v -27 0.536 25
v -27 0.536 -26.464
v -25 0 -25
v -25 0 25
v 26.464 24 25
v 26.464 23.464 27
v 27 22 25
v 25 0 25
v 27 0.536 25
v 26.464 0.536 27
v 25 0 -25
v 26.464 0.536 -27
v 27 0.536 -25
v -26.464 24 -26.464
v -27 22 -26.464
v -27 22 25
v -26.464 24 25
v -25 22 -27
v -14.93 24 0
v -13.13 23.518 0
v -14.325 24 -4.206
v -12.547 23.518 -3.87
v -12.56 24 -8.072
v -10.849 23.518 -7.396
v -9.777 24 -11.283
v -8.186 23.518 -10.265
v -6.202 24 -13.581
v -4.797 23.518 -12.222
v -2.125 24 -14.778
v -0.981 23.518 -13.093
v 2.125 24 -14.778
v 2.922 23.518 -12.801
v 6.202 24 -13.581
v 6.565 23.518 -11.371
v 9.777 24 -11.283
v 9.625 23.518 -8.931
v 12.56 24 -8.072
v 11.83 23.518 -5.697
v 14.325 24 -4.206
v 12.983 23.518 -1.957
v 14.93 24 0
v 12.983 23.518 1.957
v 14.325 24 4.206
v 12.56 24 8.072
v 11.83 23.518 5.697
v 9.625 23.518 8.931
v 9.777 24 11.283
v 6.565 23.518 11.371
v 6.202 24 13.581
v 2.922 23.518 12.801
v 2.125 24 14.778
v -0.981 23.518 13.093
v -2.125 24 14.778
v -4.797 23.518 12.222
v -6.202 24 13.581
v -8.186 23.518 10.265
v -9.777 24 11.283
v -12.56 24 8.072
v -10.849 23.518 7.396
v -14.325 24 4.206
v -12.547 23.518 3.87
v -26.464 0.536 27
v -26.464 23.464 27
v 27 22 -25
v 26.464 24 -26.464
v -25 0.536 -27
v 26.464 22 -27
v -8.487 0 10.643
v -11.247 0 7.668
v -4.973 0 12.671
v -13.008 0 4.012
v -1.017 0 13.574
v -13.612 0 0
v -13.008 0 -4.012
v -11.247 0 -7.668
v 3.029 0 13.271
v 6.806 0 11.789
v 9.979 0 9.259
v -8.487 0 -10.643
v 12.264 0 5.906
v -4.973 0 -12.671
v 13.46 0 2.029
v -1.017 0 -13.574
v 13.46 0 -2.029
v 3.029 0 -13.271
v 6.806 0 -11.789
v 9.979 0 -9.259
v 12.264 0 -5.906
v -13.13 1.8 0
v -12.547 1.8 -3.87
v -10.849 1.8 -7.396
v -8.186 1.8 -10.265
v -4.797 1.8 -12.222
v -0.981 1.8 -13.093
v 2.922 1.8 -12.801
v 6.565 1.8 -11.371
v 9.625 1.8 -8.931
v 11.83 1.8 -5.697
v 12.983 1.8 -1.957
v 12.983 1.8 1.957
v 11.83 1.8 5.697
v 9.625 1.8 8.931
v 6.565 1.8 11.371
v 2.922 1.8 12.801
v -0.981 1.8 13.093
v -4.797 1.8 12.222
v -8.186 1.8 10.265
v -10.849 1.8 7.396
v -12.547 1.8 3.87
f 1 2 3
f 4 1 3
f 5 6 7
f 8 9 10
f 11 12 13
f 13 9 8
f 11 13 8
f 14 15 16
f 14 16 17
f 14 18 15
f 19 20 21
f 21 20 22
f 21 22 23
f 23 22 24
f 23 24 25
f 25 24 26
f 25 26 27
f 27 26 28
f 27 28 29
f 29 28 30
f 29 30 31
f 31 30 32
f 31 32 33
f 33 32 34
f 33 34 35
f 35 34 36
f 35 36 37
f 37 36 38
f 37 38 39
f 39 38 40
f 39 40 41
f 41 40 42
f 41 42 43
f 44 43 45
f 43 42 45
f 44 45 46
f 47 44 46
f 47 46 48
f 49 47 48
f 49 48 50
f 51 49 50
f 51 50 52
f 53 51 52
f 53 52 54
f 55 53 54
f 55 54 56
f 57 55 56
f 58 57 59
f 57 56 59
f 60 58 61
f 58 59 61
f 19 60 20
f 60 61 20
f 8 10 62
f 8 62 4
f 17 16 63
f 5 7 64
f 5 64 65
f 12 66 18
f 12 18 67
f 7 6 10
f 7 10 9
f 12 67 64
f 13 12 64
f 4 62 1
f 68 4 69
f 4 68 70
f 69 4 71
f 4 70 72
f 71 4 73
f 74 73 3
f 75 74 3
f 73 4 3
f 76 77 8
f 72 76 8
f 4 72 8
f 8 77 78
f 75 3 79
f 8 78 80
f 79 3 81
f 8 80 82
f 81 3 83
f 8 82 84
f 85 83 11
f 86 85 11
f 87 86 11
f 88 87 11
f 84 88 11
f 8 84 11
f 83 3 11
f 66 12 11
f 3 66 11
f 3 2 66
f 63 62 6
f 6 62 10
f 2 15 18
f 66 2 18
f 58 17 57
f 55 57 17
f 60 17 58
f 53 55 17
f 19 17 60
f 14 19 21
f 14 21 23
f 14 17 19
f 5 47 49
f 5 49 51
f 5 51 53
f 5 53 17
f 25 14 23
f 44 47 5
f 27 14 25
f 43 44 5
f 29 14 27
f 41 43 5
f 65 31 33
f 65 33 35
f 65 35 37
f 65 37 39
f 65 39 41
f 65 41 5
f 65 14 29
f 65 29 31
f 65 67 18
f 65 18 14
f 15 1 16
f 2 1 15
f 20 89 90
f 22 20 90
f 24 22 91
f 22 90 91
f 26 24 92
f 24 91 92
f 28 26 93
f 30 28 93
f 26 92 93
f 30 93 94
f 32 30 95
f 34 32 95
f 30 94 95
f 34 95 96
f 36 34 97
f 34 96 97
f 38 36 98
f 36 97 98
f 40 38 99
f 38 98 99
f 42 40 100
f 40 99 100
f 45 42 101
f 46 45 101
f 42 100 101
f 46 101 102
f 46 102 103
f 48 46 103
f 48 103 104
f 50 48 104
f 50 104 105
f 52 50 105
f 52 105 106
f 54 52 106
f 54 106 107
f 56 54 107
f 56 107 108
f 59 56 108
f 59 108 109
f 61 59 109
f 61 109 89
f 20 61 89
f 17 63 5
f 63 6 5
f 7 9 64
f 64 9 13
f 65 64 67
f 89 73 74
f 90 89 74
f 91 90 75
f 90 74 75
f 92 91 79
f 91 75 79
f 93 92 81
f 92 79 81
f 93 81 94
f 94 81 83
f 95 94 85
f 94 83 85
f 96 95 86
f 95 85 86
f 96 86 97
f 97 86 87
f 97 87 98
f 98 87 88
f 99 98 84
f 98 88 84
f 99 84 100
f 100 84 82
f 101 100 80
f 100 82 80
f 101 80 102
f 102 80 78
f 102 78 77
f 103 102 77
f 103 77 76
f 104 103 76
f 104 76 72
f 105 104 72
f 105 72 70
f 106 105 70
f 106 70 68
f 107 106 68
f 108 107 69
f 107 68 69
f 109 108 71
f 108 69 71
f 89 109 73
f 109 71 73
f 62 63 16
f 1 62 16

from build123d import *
from OCP.BRepFilletAPI import BRepFilletAPI_MakeChamfer

# Parameters (mm, degrees)
SKETCH1_W             = 54
SKETCH1_H             = 54
BOSS_EXTRUDE1_DEPTH   = 24
M24_CLEARANCE_HOLE1_D = 26.26
CHAMFER2_SIZE         = 1.8
CHAMFER2_SIZE2        = 0.482308546


with BuildPart() as part:
    # Sketch1 → Boss-Extrude1 (new body)
    with BuildSketch(Plane(origin=(0, 0, 0), x_dir=(1, 0, 0), z_dir=(0, 1, 0))):
        Rectangle(SKETCH1_W, SKETCH1_H)
    extrude(amount=BOSS_EXTRUDE1_DEPTH)

    # Chamfer1
    # the kernel refuses this chamfer: 2, 0.535898385 mm, written as the material it takes off along each edge
    with BuildSketch(Plane(origin=(26.64273441, 22.666666667, -26.154700538), x_dir=(0.25881904510252285, 0, 0.9659258262890678), z_dir=(0.9636113749942796, 0.0691841839943633, -0.2581988897471632)), Plane(origin=(-26.154700538, 22.666666667, -26.64273441), x_dir=(0.9659258262890678, 0, -0.25881904510252285), z_dir=(-0.2581988897471632, 0.0691841839943633, -0.9636113749942796))) as chamfer1_piece_1:
        Polygon((-0.86273015, 0.668267901), (1.20782221, 0.668267901), (-0.34509206, -1.336535802), align=None)
    extrude(amount=0.720242762, mode=Mode.SUBTRACT)
    with BuildSketch(Plane(origin=(26.64273441, 23.154700538, 25.666666667), x_dir=(0.21132486540518758, -0.5773502691896254, -0.788675134594813), z_dir=(0.9636113749942801, 0.2581988897471616, 0.06918418399436459))) as chamfer1_piece_2:
        Polygon((-1.267949192, -0.545638456), (1.267949192, -0.545638456), (0, 1.091276912), align=None)
    extrude(amount=0.720242762, mode=Mode.SUBTRACT)
    with BuildSketch(Plane(origin=(26.154700538, 0.35726559, -25.666666667), x_dir=(0.25881904510252285, 0, 0.9659258262890678), z_dir=(0.2581988897471617, -0.9636113749942801, -0.06918418399436507)), Plane(origin=(-25.666666667, 0.35726559, -26.154700538), x_dir=(0.9659258262890678, 0, -0.25881904510252285), z_dir=(-0.06918418399436507, -0.9636113749942801, -0.2581988897471617)), Plane(origin=(-26.154700538, 0.35726559, 25.666666667), x_dir=(-0.25881904510252124, 0, -0.9659258262890682), z_dir=(-0.2581988897471617, -0.9636113749942801, 0.0691841839943646))) as chamfer1_piece_3:
        Polygon((-1.20782221, -0.668267901), (0.86273015, -0.668267901), (0.34509206, 1.336535802), align=None)
    extrude(amount=0.720242762, mode=Mode.SUBTRACT)
    with BuildSketch(Plane(origin=(26.154700538, 0.35726559, 25.666666667), x_dir=(0.25881904510252124, 0, -0.9659258262890682), z_dir=(0.2581988897471617, -0.9636113749942801, 0.0691841839943646))) as chamfer1_piece_4:
        Polygon((-1.20782221, 0.668267901), (0.86273015, 0.668267901), (0.34509206, -1.336535802), align=None)
    extrude(amount=0.720242762, mode=Mode.SUBTRACT)
    with BuildSketch(Plane(origin=(-26.64273441, 23.154700538, 25.666666667), x_dir=(-0.21132486540518758, -0.5773502691896254, -0.788675134594813), z_dir=(-0.9636113749942801, 0.2581988897471616, 0.06918418399436459))) as chamfer1_piece_5:
        Polygon((-1.267949192, 0.545638456), (1.267949192, 0.545638456), (0, -1.091276912), align=None)
    extrude(amount=0.720242762, mode=Mode.SUBTRACT)
    with BuildSketch(Plane(origin=(27, 24, -32.19344314), x_dir=(0.009967146577157254, -0.9999503267608395, 0), z_dir=(0, 0, 1)), Plane(origin=(-32.19344314, 24, -27), x_dir=(0, -0.9999503267608395, -0.009967146577157254), z_dir=(1, 0, 0)), Plane(origin=(-27, 24, 32.19344314), x_dir=(-0.009967146577157254, -0.9999503267608395, 0), z_dir=(0, 0, -1))) as chamfer1_piece_6:
        with BuildLine():
            Line((2.077377256, 0), (-0.08281798, -0.555806058))
            Line((-0.08281798, -0.555806058), (-0.122815993, -0.555407372))
            ThreePointArc((-0.122815993, -0.555407372), (-0.042771889, -0.277889444), (-0.039998013, 0.000398686))
            Line((-0.039998013, 0.000398686), (0.000398686, 0.039998013))
            ThreePointArc((0.000398686, 0.039998013), (1.038984126, 0.029645766), (2.077775942, 0.039998013))
            Line((2.077775942, 0.039998013), (2.077377256, 0))
        make_face()
    extrude(amount=64.386886281, mode=Mode.SUBTRACT)
    with BuildSketch(Plane(origin=(27, -5.19344314, -27), x_dir=(-0.9905000388259545, 0, -0.13751244702128856), z_dir=(0, 1, 0)), Plane(origin=(-27, -5.19344314, -27), x_dir=(-0.13751244702128856, 0, 0.9905000388259545), z_dir=(0, 1, 0)), Plane(origin=(-27, -5.19344314, 27), x_dir=(0.9905000388259545, 0, 0.13751244702128856), z_dir=(0, 1, 0))) as chamfer1_piece_7:
        with BuildLine():
            Line((0.561942339, 0), (-0.306159862, 2.054692776))
            Line((-0.306159862, 2.054692776), (-0.345779863, 2.049192278))
            ThreePointArc((-0.345779863, 2.049192278), (-0.182445522, 1.023269524), (-0.039620002, -0.005500498))
            Line((-0.039620002, -0.005500498), (0.005500498, -0.039620002))
            ThreePointArc((0.005500498, -0.039620002), (0.281158594, -0.001350019), (0.567442837, -0.039620002))
            Line((0.567442837, -0.039620002), (0.561942339, 0))
        make_face()
    extrude(amount=34.386886281, mode=Mode.SUBTRACT)
    with BuildSketch(Plane(origin=(27, -5.19344314, 27), x_dir=(-0.9905000388259544, 0, 0.13751244702128942), z_dir=(0, 1, 0))) as chamfer1_piece_8:
        with BuildLine():
            Line((0.561942339, 0), (-0.306159862, -2.054692776))
            Line((-0.306159862, -2.054692776), (-0.345779863, -2.049192278))
            ThreePointArc((-0.345779863, -2.049192278), (-0.182445522, -1.023269524), (-0.039620002, 0.005500498))
            Line((-0.039620002, 0.005500498), (0.005500498, 0.039620002))
            ThreePointArc((0.005500498, 0.039620002), (0.281158594, 0.001350019), (0.567442837, 0.039620002))
            Line((0.567442837, 0.039620002), (0.561942339, 0))
        make_face()
    extrude(amount=34.386886281, mode=Mode.SUBTRACT)
    with BuildSketch(Plane(origin=(-32.19344314, 0, -27), x_dir=(0, 0.9905000388259544, -0.1375124470212898), z_dir=(1, 0, 0)), Plane(origin=(27, 0, -32.19344314), x_dir=(0.13751244702128979, 0.9905000388259542, 0), z_dir=(0, 0, 1)), Plane(origin=(32.19344314, 0, 27), x_dir=(0, 0.9905000388259544, 0.1375124470212898), z_dir=(-1, 0, 0)), Plane(origin=(-27, 0, 32.19344314), x_dir=(-0.13751244702128979, 0.9905000388259542, 0), z_dir=(0, 0, -1))) as chamfer1_piece_9:
        with BuildLine():
            Line((0.561942339, 0), (-0.306159862, 2.054692776))
            Line((-0.306159862, 2.054692776), (-0.345779863, 2.049192278))
            ThreePointArc((-0.345779863, 2.049192278), (-0.182445522, 1.023269524), (-0.039620002, -0.005500498))
            Line((-0.039620002, -0.005500498), (0.005500498, -0.039620002))
            ThreePointArc((0.005500498, -0.039620002), (0.281158594, -0.001350019), (0.567442837, -0.039620002))
            Line((0.567442837, -0.039620002), (0.561942339, 0))
        make_face()
    extrude(amount=64.386886281, mode=Mode.SUBTRACT)
    with BuildSketch(Plane(origin=(32.19344314, 24, 27), x_dir=(0, -0.9905000388259544, 0.13751244702128942), z_dir=(-1, 0, 0))) as chamfer1_piece_10:
        with BuildLine():
            Line((0.561942339, 0), (-0.306159862, -2.054692776))
            Line((-0.306159862, -2.054692776), (-0.345779863, -2.049192278))
            ThreePointArc((-0.345779863, -2.049192278), (-0.182445522, -1.023269524), (-0.039620002, 0.005500498))
            Line((-0.039620002, 0.005500498), (0.005500498, 0.039620002))
            ThreePointArc((0.005500498, 0.039620002), (0.281158594, 0.001350019), (0.567442837, 0.039620002))
            Line((0.567442837, 0.039620002), (0.561942339, 0))
        make_face()
    extrude(amount=64.386886281, mode=Mode.SUBTRACT)

    # M24 Clearance Hole1 (through all)
    with Locations(Plane(origin=(0, 24, 0), x_dir=(1, 0, 0), z_dir=(0, 1, 0))):
        with Locations((0, 0)):
            Hole(M24_CLEARANCE_HOLE1_D / 2)

    # Chamfer2: one chamfer whose edges measure the first distance from different faces: ONE call of the kernel's chamfer builder (chamfer() names one face for all edges)
    chamfer2_edges_1 = [part.edges().sort_by_distance(p)[0] for p in [
        (13.13, 24, 0),
    ]]
    chamfer2_side_1 = [part.faces().sort_by_distance(p)[0] for p in [
        (0, 24, -25.725863953),
    ]]
    chamfer2_edges_2 = [part.edges().sort_by_distance(p)[0] for p in [
        (13.13, 0, 0),
    ]]
    chamfer2_side_2 = [part.faces().sort_by_distance(p)[0] for p in [
        (13.13, 12, 0),
    ]]
    chamfer2 = BRepFilletAPI_MakeChamfer(part.part.solid().wrapped)
    for e in chamfer2_edges_1:
        chamfer2.Add(CHAMFER2_SIZE, CHAMFER2_SIZE2, e.wrapped, chamfer2_side_1[0].wrapped)  # the first distance lies on this face
    for e in chamfer2_edges_2:
        chamfer2.Add(CHAMFER2_SIZE, CHAMFER2_SIZE2, e.wrapped, chamfer2_side_2[0].wrapped)  # the first distance lies on this face
    add(Compound.cast(chamfer2.Shape()), mode=Mode.REPLACE)


solid = part.part
